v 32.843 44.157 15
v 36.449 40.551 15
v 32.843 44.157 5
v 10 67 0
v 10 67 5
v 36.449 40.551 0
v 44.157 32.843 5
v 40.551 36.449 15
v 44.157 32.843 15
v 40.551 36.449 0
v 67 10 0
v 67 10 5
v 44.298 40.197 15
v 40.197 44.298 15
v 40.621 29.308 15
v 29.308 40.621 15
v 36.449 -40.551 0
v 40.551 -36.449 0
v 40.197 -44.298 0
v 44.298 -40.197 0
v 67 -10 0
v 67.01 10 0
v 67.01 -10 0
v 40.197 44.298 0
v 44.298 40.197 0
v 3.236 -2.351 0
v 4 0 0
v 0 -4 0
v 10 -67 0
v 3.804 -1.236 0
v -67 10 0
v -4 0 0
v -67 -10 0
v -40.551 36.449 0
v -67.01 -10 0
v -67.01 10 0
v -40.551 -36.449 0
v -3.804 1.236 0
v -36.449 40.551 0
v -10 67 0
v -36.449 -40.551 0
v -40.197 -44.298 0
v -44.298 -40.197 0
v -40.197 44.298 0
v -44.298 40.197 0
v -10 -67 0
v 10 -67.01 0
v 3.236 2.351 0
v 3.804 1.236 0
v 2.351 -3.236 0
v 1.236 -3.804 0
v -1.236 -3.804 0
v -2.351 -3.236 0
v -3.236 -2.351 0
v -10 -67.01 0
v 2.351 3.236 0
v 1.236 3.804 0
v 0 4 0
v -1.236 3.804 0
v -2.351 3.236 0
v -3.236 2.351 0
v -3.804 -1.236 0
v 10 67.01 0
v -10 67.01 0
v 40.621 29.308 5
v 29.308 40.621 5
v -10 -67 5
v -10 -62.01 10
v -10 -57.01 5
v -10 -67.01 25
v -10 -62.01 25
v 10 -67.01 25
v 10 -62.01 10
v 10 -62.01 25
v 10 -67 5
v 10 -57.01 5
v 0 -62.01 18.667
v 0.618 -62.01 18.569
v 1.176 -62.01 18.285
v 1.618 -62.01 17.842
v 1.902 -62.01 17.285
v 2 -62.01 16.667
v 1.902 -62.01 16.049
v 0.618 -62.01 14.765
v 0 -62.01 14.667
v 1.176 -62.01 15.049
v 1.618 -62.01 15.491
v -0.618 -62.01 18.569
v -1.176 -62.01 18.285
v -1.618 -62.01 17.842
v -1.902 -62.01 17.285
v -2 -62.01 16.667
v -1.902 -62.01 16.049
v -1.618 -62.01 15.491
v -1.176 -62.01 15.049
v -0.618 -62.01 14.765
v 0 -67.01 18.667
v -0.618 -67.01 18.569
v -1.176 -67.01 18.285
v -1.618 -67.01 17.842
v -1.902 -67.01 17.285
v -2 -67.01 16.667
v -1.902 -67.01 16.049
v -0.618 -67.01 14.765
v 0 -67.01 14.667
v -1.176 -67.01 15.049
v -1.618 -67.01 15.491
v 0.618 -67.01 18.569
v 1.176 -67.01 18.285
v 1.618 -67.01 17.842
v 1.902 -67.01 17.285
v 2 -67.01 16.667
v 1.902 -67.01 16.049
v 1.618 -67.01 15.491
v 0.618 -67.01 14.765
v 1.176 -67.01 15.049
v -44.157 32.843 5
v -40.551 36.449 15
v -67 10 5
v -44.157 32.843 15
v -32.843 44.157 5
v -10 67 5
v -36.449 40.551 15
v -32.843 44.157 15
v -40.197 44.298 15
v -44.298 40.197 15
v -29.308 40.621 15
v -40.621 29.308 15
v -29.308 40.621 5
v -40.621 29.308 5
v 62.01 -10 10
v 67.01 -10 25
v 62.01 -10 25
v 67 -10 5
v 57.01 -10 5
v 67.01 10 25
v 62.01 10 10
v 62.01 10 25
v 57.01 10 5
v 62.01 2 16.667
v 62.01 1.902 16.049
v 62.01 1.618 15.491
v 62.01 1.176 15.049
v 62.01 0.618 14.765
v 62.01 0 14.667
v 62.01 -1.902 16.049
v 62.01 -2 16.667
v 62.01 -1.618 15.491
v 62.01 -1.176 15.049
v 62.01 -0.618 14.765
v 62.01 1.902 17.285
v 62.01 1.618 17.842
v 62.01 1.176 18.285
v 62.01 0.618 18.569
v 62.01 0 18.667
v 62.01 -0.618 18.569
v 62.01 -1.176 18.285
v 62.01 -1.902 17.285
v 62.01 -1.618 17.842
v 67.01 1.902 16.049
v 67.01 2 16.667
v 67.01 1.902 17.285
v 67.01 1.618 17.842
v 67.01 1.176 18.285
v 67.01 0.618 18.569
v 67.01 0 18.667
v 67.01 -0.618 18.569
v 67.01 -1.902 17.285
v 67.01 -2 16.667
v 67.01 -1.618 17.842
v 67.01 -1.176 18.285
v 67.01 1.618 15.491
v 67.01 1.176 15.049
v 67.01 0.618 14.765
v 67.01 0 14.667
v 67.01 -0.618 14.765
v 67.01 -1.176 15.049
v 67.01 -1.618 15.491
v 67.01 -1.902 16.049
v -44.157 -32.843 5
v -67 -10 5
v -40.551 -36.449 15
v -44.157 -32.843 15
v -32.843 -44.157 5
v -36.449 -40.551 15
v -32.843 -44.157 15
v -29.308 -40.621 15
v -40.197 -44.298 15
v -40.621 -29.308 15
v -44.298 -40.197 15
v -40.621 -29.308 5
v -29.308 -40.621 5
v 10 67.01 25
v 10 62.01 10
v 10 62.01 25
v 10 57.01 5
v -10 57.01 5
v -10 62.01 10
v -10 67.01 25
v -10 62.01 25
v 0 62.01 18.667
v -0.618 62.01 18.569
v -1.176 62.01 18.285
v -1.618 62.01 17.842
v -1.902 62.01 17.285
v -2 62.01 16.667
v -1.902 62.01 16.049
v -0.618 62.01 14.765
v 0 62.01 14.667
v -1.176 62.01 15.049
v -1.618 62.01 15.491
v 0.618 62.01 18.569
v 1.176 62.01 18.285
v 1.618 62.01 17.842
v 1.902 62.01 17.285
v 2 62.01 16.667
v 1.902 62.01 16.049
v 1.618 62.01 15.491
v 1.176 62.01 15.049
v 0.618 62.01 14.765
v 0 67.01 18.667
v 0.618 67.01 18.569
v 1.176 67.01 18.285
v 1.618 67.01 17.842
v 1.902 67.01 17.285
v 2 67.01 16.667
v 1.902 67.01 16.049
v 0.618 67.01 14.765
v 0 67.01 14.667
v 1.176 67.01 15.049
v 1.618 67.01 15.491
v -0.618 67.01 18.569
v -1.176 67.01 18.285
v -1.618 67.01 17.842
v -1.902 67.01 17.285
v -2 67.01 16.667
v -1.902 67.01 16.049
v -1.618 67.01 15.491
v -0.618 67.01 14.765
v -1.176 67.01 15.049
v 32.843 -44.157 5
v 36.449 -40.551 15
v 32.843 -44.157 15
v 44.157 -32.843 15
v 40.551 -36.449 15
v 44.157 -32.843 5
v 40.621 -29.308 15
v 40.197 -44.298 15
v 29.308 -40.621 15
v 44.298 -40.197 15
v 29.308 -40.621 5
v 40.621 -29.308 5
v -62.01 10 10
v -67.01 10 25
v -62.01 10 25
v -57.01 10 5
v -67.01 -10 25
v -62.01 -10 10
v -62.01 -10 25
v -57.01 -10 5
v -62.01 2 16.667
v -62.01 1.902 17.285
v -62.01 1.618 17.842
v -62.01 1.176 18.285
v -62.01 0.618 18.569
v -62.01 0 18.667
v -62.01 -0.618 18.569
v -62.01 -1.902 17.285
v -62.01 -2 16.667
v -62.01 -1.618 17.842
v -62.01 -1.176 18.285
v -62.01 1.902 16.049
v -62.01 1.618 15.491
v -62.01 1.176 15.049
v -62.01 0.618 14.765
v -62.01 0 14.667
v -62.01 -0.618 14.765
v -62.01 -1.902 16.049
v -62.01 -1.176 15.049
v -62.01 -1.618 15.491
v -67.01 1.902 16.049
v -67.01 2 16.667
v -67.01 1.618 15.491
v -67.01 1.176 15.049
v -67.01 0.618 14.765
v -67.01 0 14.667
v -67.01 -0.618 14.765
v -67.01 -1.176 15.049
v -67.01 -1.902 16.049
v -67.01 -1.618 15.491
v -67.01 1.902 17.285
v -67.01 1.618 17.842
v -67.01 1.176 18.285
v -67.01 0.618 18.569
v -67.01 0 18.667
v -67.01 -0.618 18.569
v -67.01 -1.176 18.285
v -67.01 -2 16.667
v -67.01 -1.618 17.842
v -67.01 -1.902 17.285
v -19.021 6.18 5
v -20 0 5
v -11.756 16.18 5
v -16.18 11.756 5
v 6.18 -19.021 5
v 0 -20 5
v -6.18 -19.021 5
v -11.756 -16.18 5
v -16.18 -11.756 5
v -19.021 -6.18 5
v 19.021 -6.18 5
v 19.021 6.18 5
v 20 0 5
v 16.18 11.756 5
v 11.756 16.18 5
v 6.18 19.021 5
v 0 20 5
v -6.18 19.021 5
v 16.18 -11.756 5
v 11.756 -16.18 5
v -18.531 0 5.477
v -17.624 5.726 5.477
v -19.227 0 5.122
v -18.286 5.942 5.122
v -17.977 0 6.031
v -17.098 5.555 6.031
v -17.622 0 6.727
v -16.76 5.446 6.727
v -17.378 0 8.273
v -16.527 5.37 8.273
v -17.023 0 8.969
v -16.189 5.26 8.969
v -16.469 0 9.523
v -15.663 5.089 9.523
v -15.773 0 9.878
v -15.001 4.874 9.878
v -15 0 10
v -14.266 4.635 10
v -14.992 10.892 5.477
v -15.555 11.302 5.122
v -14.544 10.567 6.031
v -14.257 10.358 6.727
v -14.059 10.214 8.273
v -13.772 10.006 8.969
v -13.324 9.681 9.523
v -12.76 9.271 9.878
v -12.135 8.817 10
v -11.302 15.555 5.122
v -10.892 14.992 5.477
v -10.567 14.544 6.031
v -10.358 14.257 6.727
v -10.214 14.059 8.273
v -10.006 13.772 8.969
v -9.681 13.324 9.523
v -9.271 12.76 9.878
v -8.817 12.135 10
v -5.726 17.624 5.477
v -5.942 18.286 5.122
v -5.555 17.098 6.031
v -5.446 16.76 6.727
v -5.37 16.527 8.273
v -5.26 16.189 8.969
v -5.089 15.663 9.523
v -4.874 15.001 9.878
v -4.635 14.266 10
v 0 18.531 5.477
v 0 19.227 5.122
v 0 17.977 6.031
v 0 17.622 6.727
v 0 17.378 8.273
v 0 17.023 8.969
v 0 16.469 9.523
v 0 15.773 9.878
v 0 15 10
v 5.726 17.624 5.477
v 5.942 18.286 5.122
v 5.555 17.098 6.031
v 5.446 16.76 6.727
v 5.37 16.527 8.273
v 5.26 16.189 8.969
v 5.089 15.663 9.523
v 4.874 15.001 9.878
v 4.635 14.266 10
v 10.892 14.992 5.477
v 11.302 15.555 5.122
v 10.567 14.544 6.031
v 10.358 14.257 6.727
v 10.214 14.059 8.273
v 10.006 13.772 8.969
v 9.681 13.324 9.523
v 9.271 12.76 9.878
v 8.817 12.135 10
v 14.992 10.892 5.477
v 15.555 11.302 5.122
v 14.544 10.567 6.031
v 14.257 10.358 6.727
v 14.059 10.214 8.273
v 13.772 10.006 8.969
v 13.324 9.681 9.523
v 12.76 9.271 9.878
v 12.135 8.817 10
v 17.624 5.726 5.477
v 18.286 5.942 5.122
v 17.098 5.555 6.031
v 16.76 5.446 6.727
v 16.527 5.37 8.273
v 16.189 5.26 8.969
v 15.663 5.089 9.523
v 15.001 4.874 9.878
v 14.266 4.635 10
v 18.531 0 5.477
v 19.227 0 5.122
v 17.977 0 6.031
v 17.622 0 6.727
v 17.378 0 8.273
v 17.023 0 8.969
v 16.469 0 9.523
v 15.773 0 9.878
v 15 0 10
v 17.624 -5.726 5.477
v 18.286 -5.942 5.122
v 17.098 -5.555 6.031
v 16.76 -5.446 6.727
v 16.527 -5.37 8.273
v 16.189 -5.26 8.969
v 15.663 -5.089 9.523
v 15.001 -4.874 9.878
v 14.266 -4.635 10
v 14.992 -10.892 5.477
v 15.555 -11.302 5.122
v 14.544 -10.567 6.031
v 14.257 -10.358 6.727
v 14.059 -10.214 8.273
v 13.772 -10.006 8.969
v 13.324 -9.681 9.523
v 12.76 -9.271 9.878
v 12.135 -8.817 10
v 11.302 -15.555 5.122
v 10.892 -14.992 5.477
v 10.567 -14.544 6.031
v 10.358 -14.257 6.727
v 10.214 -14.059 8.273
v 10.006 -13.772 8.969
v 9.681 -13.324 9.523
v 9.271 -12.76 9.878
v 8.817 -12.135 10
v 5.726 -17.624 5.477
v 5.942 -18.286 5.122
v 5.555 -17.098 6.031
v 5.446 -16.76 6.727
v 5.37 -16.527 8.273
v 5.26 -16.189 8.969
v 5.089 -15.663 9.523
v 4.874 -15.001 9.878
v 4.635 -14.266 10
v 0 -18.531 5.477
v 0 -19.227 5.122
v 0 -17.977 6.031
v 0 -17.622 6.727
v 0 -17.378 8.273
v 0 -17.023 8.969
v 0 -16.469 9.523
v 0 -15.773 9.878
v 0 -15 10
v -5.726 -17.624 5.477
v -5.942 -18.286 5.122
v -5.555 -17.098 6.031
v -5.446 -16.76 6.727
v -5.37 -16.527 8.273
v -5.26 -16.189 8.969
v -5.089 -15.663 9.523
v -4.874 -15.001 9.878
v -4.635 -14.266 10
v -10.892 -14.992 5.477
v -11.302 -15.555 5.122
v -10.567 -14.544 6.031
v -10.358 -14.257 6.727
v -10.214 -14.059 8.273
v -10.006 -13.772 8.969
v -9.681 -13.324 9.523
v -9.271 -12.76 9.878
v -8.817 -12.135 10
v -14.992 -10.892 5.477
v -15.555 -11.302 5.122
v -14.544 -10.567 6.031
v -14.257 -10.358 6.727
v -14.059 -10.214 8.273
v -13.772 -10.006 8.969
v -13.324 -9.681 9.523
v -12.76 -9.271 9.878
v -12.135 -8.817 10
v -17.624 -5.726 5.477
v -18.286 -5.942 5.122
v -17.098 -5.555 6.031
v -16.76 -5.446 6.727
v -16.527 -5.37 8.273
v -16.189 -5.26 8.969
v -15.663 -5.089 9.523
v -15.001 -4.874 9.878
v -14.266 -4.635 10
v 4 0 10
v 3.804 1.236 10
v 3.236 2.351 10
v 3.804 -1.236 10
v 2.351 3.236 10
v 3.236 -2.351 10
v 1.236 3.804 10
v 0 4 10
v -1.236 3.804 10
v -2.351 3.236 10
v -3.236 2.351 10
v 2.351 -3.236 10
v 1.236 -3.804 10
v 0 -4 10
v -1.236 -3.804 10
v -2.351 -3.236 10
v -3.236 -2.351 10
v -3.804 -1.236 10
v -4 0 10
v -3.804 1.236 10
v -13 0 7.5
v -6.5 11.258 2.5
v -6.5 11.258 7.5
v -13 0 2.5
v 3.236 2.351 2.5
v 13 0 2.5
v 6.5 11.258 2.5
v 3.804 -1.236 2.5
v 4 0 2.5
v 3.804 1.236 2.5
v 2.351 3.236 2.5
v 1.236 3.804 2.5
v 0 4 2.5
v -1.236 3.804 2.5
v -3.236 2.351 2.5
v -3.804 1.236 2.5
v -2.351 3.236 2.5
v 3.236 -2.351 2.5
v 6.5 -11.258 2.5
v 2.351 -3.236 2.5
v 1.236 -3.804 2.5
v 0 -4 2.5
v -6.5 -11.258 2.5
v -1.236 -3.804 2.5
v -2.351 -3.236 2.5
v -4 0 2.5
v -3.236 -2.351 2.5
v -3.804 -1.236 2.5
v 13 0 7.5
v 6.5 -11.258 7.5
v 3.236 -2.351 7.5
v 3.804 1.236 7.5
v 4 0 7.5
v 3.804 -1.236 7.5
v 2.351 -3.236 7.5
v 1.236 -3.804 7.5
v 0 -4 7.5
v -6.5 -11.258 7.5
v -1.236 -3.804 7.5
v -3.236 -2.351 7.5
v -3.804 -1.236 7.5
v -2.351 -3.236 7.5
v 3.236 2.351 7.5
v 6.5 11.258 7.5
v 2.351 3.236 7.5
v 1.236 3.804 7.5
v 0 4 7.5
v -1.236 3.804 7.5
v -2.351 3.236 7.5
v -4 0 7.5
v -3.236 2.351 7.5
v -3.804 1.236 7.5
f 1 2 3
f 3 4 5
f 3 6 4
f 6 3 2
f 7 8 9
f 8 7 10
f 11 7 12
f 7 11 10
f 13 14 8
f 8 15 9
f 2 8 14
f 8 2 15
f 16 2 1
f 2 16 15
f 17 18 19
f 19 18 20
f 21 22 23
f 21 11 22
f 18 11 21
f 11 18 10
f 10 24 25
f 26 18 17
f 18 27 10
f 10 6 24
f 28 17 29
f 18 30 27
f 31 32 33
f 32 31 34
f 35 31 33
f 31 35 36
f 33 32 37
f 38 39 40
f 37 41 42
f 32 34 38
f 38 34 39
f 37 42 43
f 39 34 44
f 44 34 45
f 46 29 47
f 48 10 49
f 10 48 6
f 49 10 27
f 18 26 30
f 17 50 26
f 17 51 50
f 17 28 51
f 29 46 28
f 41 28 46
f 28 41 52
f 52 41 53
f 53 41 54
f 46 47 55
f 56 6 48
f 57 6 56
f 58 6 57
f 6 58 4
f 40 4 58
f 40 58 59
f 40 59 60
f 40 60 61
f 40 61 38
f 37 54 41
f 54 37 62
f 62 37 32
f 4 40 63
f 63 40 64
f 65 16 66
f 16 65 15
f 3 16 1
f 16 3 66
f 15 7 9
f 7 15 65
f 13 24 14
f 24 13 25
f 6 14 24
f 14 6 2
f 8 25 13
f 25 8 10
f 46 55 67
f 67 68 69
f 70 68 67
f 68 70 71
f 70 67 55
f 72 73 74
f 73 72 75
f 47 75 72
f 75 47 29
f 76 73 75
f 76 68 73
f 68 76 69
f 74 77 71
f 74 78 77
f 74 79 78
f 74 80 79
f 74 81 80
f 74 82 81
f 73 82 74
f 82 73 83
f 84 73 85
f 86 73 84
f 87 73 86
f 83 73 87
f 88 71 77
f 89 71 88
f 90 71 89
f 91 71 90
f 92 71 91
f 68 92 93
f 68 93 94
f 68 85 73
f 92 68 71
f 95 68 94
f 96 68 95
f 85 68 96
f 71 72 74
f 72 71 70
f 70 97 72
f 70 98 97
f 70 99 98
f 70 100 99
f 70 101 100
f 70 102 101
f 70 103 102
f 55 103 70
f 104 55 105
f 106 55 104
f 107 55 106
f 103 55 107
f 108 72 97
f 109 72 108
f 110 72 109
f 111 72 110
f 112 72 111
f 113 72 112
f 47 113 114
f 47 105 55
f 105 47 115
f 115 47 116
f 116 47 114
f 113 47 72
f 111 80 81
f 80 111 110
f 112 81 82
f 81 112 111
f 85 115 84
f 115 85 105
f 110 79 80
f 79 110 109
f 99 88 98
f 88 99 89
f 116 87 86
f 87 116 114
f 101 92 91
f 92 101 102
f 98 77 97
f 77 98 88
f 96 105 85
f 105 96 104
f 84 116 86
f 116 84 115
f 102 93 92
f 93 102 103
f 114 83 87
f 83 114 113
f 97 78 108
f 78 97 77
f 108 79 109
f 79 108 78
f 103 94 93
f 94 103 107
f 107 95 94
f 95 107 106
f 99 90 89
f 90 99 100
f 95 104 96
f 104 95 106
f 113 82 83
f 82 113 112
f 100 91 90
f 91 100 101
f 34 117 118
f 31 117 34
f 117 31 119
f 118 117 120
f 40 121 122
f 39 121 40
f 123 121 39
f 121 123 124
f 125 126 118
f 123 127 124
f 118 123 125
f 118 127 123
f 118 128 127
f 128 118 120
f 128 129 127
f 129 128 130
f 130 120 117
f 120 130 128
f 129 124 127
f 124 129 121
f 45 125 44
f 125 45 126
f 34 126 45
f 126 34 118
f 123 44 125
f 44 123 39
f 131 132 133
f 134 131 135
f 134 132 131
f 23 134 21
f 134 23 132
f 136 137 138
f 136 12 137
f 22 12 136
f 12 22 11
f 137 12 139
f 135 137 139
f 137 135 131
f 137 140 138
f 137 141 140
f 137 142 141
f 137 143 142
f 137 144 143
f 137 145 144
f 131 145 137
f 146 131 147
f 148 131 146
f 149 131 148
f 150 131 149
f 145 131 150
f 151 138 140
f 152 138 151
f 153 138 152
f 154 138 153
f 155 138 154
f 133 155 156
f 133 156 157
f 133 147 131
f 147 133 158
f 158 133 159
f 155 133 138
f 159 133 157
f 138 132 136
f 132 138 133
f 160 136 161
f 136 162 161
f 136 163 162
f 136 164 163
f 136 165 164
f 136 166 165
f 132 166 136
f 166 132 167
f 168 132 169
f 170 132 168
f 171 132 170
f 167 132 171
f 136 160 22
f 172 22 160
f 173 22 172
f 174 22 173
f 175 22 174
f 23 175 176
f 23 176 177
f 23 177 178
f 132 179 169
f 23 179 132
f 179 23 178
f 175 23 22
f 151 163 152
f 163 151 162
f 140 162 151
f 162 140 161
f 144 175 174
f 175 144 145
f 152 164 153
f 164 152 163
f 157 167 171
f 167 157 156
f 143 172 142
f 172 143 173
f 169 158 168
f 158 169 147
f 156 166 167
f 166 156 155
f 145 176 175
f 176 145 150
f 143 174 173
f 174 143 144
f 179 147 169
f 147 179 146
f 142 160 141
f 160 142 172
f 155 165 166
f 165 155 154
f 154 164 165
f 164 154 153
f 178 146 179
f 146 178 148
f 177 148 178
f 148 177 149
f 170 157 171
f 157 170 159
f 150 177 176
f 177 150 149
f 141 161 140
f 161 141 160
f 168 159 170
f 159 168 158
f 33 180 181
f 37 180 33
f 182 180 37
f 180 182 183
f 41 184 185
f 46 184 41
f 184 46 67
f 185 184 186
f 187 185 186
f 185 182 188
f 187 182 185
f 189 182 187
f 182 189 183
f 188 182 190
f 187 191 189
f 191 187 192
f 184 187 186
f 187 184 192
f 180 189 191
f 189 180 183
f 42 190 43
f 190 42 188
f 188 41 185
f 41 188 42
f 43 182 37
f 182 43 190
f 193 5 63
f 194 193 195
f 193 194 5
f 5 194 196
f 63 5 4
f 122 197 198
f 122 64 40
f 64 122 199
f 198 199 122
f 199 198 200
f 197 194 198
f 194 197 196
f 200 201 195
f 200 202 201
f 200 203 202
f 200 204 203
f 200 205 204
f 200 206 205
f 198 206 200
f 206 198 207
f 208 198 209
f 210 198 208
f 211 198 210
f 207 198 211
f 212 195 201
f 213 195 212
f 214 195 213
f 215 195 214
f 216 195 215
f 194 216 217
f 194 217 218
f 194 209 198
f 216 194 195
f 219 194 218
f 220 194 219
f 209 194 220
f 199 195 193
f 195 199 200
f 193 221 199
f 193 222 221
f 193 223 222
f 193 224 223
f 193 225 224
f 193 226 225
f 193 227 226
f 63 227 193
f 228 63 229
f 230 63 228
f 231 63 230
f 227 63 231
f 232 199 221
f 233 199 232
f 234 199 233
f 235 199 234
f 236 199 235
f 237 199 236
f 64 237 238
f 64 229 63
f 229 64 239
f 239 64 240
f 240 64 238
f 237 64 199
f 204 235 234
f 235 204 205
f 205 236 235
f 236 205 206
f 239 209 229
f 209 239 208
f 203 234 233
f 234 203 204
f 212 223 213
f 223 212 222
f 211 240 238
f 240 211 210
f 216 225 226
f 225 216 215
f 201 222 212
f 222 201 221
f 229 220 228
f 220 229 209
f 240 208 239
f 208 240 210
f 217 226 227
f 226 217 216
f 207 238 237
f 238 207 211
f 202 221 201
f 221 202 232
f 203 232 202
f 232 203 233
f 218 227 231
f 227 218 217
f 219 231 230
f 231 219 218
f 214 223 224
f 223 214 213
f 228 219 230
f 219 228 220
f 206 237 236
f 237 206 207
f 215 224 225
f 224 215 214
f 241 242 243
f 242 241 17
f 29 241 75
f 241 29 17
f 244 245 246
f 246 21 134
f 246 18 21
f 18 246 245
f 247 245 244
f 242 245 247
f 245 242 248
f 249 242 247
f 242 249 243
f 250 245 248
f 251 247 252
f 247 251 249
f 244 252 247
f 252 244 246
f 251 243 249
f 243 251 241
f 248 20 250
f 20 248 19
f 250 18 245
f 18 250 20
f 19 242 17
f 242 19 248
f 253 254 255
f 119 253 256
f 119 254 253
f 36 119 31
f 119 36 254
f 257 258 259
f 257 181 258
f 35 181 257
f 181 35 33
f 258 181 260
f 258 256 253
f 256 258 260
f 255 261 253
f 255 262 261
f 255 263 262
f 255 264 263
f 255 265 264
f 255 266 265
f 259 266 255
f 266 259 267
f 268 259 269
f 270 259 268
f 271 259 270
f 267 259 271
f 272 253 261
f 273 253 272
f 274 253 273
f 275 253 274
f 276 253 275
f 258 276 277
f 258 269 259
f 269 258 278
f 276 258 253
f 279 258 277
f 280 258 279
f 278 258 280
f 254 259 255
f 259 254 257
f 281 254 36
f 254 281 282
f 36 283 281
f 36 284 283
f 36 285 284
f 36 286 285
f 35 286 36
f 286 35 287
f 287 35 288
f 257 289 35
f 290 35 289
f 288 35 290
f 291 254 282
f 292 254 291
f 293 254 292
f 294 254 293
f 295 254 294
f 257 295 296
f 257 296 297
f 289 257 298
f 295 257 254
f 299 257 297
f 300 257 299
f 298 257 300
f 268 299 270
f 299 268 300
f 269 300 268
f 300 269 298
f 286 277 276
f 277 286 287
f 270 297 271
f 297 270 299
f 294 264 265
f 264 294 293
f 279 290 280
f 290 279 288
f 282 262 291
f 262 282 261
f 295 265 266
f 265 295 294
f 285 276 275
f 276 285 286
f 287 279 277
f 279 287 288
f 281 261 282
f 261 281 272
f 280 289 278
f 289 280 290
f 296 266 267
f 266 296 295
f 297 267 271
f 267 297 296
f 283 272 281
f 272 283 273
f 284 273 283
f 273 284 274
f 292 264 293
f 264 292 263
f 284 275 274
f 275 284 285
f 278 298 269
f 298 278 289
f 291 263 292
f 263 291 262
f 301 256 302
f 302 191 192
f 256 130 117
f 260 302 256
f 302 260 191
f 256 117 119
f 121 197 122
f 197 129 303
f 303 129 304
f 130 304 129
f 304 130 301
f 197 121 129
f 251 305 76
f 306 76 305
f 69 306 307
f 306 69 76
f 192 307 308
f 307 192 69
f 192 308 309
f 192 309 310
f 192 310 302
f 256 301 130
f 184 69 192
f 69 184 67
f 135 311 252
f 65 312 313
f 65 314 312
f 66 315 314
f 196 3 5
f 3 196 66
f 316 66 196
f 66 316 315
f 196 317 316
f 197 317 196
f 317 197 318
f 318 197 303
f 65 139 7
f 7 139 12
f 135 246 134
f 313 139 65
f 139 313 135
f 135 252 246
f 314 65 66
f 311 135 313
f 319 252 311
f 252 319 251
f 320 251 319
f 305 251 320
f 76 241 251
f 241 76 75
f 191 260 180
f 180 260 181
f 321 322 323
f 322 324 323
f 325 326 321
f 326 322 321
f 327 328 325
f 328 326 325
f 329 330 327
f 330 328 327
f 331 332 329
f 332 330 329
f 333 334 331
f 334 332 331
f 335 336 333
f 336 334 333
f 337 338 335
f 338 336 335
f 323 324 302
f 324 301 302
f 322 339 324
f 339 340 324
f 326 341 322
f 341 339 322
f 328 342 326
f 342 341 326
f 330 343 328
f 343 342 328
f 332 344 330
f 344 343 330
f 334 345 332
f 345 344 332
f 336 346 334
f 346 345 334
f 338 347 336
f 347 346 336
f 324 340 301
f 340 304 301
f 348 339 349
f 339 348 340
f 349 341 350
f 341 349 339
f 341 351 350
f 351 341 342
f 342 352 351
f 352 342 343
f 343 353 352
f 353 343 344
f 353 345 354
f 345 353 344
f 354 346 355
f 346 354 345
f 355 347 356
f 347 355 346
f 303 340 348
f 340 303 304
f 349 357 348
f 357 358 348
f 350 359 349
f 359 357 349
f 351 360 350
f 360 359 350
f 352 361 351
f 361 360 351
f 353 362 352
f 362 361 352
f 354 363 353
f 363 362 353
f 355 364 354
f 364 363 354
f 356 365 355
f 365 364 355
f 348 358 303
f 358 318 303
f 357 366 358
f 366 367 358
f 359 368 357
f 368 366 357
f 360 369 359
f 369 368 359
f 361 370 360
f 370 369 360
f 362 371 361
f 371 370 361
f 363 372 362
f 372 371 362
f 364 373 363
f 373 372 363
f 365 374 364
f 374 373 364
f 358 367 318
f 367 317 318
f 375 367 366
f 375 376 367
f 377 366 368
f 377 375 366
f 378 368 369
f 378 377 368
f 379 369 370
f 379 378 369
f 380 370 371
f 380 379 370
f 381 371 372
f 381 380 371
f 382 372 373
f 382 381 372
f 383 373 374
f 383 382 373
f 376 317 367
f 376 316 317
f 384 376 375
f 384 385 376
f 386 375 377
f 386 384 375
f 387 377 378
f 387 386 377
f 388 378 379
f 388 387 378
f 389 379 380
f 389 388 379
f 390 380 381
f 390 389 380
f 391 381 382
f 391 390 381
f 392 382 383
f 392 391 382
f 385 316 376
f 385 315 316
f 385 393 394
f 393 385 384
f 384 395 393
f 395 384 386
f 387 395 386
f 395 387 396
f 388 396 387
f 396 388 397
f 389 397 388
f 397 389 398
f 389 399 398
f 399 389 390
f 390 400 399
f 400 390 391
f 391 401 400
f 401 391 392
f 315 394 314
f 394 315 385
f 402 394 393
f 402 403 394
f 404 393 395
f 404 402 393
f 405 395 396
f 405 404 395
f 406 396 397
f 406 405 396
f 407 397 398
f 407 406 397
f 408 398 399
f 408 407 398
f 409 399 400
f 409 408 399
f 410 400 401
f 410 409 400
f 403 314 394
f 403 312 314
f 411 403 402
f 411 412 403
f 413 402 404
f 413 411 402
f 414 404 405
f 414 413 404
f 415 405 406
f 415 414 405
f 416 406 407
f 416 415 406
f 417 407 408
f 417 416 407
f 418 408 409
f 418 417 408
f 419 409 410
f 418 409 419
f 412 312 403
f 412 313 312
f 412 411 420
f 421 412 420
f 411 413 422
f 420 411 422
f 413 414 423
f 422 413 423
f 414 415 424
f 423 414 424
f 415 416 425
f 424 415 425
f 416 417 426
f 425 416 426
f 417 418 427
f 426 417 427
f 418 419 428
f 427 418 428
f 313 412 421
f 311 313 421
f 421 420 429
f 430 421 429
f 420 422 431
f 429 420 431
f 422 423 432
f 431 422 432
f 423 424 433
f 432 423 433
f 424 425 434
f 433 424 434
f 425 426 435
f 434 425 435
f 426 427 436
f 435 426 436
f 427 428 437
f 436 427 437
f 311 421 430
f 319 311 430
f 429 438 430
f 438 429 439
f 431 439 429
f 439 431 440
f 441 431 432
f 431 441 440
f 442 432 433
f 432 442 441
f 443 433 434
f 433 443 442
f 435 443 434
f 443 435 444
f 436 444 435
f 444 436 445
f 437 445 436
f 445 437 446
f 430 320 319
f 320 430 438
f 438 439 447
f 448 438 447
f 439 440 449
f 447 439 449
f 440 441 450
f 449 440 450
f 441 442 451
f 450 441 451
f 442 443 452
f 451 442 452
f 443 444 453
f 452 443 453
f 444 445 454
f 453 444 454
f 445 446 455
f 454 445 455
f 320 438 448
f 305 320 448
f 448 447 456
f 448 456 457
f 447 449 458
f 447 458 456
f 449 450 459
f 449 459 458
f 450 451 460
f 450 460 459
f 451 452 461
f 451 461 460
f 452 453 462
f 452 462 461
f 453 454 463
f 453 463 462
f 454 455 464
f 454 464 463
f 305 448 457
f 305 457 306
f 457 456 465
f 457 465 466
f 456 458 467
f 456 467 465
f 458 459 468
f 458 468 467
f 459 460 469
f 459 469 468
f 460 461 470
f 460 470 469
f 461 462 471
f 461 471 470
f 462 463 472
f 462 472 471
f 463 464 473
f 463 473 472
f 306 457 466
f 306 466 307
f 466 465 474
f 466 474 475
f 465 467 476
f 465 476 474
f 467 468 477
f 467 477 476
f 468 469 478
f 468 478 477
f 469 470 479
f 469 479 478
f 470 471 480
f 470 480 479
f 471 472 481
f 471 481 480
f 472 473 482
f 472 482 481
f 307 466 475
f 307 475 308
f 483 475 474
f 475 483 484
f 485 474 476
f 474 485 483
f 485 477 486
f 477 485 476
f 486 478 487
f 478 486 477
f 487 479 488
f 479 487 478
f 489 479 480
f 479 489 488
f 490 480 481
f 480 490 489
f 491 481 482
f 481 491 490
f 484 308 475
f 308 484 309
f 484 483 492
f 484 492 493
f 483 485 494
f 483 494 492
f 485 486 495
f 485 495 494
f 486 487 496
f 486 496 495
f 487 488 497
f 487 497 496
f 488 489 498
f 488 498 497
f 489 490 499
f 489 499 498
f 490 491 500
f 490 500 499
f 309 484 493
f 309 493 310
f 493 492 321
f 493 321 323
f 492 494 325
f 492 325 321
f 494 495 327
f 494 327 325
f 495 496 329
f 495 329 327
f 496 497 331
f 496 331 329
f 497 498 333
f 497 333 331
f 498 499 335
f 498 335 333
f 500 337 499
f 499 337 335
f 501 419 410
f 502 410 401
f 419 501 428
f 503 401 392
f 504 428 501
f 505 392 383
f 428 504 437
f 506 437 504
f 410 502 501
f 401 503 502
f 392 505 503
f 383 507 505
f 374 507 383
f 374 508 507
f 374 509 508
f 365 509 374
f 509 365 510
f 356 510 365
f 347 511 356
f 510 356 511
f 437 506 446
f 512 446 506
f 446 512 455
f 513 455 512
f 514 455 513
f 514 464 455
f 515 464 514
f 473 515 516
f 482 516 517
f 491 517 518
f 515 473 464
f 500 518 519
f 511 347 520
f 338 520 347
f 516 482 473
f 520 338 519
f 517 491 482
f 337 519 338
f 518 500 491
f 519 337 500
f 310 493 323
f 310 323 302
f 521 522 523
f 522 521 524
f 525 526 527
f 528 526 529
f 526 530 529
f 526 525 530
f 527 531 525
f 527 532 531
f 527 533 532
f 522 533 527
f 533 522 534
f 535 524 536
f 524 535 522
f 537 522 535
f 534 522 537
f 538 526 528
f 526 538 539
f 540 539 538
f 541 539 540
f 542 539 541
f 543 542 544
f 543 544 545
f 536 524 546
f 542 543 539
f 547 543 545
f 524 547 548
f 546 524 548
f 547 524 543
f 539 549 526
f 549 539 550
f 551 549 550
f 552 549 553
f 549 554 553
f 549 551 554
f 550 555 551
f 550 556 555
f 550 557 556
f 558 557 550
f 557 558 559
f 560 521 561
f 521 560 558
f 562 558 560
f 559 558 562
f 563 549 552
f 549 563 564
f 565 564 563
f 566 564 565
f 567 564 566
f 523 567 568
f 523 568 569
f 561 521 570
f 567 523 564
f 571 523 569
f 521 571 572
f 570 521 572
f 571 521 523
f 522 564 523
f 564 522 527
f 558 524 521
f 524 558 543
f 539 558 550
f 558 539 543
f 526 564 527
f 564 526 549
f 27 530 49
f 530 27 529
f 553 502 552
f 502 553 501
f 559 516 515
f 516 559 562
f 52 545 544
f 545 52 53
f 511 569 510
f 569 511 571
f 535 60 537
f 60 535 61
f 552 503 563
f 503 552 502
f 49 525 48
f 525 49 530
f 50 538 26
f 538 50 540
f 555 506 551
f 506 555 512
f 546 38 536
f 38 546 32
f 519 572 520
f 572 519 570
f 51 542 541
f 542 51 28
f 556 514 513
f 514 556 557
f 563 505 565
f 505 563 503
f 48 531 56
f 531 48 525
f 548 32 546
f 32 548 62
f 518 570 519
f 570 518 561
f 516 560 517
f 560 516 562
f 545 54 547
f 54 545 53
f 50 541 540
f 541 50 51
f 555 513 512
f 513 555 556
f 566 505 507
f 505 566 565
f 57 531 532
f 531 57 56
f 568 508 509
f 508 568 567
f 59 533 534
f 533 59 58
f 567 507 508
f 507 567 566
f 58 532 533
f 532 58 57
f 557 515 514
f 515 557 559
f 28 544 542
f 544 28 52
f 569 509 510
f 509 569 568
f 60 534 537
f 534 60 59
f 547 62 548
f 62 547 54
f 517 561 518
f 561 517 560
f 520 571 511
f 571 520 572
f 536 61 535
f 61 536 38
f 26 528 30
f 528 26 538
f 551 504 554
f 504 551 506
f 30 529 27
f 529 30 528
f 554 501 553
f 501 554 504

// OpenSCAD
taille = 134;
largeurPatte = 20;
largeurGuide = 16;
epaisseur = 5;
$fn = 20;

difference() {
	union() {
		plateForme(taille, largeurPatte);
		for (i = [0 : 3]) {
			rotate(i * 90) {
				translate([taille / 4 + largeurPatte / 4, taille / 4 + largeurPatte / 4, 0]) {
					rotate(45) {
						guide(largeurGuide, epaisseur);
					}
				}
				translate([0, -taille / 2 - 0.01, 0]) { // 
					patteAccroche(20, 25, epaisseur); // Largeur, Hauteur, Epaisseur
				}
			}
		}
		translate([0, 0, epaisseur]) {
			renfortEcrou(20, epaisseur);
		}
	}
	translate([0, 0, epaisseur]) {
		ecrou(13, 5);
	}
}

//translate([taille / 4 + largeurPatte / 4, taille / 4 + largeurPatte / 4, 0]) {
//					rotate(45) {
//						translate([0, -10, 0]) cube(20);
//					}
//				}

module plateForme(taille, largeurPatte) {
	linear_extrude(height = epaisseur, center = false, convexity = 10, twist = 0)
	polygon([	[-taille / 2, largeurPatte / 2], [-largeurPatte / 2, taille / 2],
				[largeurPatte / 2, taille / 2], [taille / 2, largeurPatte / 2],
				[taille / 2, -largeurPatte / 2], [largeurPatte / 2, -taille / 2],
				[-largeurPatte / 2, -taille / 2], [-taille / 2, -largeurPatte / 2]
	]);
}

module guide(largeur, epaisseur) {
	translate([-epaisseur, -largeur / 2, 0]) cube([epaisseur, largeur, 15]);
	translate([0, -2.9, 0]) cube([5.3, 5.8, 15]);
}

module ecrou(tailleEcrou, epaisseurEcrou) {
	union() {
		linear_extrude(height = epaisseurEcrou, center = true, convexity = 10, twist = 0)
		polygon(points =	[ [tailleEcrou, 0], 
						[tailleEcrou * cos(60), tailleEcrou * sin(60)], 
						[tailleEcrou * cos(120), tailleEcrou * sin(120)], 
						[tailleEcrou * cos(180), tailleEcrou * sin(180)], 
						[tailleEcrou * cos(240), tailleEcrou * sin(240)], 
						[tailleEcrou * cos(300), tailleEcrou * sin(300)]]);
		translate(v = [0, 0, -10]) {		
			cylinder(h=20, r=tailleEcrou * (4 / 13));
		}
	}
}

module patteAccroche(largeur, hauteur, epaisseur) {
	difference() {
		translate([-largeur / 2, , 00]) 		
		rotate([90, 0, 90]) 
		linear_extrude(height = largeur, center = false, convexity = 10, twist = 0)
		polygon([	[0, 0], [2 * epaisseur, 0],
					[2 * epaisseur, epaisseur], [epaisseur, 2 * epaisseur],
					[epaisseur, hauteur], [0, hauteur]
		]);
		translate ([0, 0, 2 * hauteur / 3]) 
		rotate ([90,0,0]) cylinder (h = 20, r = 2, center = true);
	}
}

module renfortEcrou(diametre, epaisseur) {
	translate([0,0, epaisseur / 2]) {
		rotate_extrude(convexity = 10) {
			difference() {
				union() {
					translate([(diametre - epaisseur) / 2, 0, 0]) square([diametre - epaisseur, epaisseur], true);
					translate([(diametre - epaisseur) , 0, 0]) circle(epaisseur / 2);
					translate([(diametre - epaisseur), -epaisseur /2, 0]) square([epaisseur, epaisseur /2]);
				}
				translate([diametre, 0, 0]) circle(epaisseur / 2);
			}
		}
	}
}
